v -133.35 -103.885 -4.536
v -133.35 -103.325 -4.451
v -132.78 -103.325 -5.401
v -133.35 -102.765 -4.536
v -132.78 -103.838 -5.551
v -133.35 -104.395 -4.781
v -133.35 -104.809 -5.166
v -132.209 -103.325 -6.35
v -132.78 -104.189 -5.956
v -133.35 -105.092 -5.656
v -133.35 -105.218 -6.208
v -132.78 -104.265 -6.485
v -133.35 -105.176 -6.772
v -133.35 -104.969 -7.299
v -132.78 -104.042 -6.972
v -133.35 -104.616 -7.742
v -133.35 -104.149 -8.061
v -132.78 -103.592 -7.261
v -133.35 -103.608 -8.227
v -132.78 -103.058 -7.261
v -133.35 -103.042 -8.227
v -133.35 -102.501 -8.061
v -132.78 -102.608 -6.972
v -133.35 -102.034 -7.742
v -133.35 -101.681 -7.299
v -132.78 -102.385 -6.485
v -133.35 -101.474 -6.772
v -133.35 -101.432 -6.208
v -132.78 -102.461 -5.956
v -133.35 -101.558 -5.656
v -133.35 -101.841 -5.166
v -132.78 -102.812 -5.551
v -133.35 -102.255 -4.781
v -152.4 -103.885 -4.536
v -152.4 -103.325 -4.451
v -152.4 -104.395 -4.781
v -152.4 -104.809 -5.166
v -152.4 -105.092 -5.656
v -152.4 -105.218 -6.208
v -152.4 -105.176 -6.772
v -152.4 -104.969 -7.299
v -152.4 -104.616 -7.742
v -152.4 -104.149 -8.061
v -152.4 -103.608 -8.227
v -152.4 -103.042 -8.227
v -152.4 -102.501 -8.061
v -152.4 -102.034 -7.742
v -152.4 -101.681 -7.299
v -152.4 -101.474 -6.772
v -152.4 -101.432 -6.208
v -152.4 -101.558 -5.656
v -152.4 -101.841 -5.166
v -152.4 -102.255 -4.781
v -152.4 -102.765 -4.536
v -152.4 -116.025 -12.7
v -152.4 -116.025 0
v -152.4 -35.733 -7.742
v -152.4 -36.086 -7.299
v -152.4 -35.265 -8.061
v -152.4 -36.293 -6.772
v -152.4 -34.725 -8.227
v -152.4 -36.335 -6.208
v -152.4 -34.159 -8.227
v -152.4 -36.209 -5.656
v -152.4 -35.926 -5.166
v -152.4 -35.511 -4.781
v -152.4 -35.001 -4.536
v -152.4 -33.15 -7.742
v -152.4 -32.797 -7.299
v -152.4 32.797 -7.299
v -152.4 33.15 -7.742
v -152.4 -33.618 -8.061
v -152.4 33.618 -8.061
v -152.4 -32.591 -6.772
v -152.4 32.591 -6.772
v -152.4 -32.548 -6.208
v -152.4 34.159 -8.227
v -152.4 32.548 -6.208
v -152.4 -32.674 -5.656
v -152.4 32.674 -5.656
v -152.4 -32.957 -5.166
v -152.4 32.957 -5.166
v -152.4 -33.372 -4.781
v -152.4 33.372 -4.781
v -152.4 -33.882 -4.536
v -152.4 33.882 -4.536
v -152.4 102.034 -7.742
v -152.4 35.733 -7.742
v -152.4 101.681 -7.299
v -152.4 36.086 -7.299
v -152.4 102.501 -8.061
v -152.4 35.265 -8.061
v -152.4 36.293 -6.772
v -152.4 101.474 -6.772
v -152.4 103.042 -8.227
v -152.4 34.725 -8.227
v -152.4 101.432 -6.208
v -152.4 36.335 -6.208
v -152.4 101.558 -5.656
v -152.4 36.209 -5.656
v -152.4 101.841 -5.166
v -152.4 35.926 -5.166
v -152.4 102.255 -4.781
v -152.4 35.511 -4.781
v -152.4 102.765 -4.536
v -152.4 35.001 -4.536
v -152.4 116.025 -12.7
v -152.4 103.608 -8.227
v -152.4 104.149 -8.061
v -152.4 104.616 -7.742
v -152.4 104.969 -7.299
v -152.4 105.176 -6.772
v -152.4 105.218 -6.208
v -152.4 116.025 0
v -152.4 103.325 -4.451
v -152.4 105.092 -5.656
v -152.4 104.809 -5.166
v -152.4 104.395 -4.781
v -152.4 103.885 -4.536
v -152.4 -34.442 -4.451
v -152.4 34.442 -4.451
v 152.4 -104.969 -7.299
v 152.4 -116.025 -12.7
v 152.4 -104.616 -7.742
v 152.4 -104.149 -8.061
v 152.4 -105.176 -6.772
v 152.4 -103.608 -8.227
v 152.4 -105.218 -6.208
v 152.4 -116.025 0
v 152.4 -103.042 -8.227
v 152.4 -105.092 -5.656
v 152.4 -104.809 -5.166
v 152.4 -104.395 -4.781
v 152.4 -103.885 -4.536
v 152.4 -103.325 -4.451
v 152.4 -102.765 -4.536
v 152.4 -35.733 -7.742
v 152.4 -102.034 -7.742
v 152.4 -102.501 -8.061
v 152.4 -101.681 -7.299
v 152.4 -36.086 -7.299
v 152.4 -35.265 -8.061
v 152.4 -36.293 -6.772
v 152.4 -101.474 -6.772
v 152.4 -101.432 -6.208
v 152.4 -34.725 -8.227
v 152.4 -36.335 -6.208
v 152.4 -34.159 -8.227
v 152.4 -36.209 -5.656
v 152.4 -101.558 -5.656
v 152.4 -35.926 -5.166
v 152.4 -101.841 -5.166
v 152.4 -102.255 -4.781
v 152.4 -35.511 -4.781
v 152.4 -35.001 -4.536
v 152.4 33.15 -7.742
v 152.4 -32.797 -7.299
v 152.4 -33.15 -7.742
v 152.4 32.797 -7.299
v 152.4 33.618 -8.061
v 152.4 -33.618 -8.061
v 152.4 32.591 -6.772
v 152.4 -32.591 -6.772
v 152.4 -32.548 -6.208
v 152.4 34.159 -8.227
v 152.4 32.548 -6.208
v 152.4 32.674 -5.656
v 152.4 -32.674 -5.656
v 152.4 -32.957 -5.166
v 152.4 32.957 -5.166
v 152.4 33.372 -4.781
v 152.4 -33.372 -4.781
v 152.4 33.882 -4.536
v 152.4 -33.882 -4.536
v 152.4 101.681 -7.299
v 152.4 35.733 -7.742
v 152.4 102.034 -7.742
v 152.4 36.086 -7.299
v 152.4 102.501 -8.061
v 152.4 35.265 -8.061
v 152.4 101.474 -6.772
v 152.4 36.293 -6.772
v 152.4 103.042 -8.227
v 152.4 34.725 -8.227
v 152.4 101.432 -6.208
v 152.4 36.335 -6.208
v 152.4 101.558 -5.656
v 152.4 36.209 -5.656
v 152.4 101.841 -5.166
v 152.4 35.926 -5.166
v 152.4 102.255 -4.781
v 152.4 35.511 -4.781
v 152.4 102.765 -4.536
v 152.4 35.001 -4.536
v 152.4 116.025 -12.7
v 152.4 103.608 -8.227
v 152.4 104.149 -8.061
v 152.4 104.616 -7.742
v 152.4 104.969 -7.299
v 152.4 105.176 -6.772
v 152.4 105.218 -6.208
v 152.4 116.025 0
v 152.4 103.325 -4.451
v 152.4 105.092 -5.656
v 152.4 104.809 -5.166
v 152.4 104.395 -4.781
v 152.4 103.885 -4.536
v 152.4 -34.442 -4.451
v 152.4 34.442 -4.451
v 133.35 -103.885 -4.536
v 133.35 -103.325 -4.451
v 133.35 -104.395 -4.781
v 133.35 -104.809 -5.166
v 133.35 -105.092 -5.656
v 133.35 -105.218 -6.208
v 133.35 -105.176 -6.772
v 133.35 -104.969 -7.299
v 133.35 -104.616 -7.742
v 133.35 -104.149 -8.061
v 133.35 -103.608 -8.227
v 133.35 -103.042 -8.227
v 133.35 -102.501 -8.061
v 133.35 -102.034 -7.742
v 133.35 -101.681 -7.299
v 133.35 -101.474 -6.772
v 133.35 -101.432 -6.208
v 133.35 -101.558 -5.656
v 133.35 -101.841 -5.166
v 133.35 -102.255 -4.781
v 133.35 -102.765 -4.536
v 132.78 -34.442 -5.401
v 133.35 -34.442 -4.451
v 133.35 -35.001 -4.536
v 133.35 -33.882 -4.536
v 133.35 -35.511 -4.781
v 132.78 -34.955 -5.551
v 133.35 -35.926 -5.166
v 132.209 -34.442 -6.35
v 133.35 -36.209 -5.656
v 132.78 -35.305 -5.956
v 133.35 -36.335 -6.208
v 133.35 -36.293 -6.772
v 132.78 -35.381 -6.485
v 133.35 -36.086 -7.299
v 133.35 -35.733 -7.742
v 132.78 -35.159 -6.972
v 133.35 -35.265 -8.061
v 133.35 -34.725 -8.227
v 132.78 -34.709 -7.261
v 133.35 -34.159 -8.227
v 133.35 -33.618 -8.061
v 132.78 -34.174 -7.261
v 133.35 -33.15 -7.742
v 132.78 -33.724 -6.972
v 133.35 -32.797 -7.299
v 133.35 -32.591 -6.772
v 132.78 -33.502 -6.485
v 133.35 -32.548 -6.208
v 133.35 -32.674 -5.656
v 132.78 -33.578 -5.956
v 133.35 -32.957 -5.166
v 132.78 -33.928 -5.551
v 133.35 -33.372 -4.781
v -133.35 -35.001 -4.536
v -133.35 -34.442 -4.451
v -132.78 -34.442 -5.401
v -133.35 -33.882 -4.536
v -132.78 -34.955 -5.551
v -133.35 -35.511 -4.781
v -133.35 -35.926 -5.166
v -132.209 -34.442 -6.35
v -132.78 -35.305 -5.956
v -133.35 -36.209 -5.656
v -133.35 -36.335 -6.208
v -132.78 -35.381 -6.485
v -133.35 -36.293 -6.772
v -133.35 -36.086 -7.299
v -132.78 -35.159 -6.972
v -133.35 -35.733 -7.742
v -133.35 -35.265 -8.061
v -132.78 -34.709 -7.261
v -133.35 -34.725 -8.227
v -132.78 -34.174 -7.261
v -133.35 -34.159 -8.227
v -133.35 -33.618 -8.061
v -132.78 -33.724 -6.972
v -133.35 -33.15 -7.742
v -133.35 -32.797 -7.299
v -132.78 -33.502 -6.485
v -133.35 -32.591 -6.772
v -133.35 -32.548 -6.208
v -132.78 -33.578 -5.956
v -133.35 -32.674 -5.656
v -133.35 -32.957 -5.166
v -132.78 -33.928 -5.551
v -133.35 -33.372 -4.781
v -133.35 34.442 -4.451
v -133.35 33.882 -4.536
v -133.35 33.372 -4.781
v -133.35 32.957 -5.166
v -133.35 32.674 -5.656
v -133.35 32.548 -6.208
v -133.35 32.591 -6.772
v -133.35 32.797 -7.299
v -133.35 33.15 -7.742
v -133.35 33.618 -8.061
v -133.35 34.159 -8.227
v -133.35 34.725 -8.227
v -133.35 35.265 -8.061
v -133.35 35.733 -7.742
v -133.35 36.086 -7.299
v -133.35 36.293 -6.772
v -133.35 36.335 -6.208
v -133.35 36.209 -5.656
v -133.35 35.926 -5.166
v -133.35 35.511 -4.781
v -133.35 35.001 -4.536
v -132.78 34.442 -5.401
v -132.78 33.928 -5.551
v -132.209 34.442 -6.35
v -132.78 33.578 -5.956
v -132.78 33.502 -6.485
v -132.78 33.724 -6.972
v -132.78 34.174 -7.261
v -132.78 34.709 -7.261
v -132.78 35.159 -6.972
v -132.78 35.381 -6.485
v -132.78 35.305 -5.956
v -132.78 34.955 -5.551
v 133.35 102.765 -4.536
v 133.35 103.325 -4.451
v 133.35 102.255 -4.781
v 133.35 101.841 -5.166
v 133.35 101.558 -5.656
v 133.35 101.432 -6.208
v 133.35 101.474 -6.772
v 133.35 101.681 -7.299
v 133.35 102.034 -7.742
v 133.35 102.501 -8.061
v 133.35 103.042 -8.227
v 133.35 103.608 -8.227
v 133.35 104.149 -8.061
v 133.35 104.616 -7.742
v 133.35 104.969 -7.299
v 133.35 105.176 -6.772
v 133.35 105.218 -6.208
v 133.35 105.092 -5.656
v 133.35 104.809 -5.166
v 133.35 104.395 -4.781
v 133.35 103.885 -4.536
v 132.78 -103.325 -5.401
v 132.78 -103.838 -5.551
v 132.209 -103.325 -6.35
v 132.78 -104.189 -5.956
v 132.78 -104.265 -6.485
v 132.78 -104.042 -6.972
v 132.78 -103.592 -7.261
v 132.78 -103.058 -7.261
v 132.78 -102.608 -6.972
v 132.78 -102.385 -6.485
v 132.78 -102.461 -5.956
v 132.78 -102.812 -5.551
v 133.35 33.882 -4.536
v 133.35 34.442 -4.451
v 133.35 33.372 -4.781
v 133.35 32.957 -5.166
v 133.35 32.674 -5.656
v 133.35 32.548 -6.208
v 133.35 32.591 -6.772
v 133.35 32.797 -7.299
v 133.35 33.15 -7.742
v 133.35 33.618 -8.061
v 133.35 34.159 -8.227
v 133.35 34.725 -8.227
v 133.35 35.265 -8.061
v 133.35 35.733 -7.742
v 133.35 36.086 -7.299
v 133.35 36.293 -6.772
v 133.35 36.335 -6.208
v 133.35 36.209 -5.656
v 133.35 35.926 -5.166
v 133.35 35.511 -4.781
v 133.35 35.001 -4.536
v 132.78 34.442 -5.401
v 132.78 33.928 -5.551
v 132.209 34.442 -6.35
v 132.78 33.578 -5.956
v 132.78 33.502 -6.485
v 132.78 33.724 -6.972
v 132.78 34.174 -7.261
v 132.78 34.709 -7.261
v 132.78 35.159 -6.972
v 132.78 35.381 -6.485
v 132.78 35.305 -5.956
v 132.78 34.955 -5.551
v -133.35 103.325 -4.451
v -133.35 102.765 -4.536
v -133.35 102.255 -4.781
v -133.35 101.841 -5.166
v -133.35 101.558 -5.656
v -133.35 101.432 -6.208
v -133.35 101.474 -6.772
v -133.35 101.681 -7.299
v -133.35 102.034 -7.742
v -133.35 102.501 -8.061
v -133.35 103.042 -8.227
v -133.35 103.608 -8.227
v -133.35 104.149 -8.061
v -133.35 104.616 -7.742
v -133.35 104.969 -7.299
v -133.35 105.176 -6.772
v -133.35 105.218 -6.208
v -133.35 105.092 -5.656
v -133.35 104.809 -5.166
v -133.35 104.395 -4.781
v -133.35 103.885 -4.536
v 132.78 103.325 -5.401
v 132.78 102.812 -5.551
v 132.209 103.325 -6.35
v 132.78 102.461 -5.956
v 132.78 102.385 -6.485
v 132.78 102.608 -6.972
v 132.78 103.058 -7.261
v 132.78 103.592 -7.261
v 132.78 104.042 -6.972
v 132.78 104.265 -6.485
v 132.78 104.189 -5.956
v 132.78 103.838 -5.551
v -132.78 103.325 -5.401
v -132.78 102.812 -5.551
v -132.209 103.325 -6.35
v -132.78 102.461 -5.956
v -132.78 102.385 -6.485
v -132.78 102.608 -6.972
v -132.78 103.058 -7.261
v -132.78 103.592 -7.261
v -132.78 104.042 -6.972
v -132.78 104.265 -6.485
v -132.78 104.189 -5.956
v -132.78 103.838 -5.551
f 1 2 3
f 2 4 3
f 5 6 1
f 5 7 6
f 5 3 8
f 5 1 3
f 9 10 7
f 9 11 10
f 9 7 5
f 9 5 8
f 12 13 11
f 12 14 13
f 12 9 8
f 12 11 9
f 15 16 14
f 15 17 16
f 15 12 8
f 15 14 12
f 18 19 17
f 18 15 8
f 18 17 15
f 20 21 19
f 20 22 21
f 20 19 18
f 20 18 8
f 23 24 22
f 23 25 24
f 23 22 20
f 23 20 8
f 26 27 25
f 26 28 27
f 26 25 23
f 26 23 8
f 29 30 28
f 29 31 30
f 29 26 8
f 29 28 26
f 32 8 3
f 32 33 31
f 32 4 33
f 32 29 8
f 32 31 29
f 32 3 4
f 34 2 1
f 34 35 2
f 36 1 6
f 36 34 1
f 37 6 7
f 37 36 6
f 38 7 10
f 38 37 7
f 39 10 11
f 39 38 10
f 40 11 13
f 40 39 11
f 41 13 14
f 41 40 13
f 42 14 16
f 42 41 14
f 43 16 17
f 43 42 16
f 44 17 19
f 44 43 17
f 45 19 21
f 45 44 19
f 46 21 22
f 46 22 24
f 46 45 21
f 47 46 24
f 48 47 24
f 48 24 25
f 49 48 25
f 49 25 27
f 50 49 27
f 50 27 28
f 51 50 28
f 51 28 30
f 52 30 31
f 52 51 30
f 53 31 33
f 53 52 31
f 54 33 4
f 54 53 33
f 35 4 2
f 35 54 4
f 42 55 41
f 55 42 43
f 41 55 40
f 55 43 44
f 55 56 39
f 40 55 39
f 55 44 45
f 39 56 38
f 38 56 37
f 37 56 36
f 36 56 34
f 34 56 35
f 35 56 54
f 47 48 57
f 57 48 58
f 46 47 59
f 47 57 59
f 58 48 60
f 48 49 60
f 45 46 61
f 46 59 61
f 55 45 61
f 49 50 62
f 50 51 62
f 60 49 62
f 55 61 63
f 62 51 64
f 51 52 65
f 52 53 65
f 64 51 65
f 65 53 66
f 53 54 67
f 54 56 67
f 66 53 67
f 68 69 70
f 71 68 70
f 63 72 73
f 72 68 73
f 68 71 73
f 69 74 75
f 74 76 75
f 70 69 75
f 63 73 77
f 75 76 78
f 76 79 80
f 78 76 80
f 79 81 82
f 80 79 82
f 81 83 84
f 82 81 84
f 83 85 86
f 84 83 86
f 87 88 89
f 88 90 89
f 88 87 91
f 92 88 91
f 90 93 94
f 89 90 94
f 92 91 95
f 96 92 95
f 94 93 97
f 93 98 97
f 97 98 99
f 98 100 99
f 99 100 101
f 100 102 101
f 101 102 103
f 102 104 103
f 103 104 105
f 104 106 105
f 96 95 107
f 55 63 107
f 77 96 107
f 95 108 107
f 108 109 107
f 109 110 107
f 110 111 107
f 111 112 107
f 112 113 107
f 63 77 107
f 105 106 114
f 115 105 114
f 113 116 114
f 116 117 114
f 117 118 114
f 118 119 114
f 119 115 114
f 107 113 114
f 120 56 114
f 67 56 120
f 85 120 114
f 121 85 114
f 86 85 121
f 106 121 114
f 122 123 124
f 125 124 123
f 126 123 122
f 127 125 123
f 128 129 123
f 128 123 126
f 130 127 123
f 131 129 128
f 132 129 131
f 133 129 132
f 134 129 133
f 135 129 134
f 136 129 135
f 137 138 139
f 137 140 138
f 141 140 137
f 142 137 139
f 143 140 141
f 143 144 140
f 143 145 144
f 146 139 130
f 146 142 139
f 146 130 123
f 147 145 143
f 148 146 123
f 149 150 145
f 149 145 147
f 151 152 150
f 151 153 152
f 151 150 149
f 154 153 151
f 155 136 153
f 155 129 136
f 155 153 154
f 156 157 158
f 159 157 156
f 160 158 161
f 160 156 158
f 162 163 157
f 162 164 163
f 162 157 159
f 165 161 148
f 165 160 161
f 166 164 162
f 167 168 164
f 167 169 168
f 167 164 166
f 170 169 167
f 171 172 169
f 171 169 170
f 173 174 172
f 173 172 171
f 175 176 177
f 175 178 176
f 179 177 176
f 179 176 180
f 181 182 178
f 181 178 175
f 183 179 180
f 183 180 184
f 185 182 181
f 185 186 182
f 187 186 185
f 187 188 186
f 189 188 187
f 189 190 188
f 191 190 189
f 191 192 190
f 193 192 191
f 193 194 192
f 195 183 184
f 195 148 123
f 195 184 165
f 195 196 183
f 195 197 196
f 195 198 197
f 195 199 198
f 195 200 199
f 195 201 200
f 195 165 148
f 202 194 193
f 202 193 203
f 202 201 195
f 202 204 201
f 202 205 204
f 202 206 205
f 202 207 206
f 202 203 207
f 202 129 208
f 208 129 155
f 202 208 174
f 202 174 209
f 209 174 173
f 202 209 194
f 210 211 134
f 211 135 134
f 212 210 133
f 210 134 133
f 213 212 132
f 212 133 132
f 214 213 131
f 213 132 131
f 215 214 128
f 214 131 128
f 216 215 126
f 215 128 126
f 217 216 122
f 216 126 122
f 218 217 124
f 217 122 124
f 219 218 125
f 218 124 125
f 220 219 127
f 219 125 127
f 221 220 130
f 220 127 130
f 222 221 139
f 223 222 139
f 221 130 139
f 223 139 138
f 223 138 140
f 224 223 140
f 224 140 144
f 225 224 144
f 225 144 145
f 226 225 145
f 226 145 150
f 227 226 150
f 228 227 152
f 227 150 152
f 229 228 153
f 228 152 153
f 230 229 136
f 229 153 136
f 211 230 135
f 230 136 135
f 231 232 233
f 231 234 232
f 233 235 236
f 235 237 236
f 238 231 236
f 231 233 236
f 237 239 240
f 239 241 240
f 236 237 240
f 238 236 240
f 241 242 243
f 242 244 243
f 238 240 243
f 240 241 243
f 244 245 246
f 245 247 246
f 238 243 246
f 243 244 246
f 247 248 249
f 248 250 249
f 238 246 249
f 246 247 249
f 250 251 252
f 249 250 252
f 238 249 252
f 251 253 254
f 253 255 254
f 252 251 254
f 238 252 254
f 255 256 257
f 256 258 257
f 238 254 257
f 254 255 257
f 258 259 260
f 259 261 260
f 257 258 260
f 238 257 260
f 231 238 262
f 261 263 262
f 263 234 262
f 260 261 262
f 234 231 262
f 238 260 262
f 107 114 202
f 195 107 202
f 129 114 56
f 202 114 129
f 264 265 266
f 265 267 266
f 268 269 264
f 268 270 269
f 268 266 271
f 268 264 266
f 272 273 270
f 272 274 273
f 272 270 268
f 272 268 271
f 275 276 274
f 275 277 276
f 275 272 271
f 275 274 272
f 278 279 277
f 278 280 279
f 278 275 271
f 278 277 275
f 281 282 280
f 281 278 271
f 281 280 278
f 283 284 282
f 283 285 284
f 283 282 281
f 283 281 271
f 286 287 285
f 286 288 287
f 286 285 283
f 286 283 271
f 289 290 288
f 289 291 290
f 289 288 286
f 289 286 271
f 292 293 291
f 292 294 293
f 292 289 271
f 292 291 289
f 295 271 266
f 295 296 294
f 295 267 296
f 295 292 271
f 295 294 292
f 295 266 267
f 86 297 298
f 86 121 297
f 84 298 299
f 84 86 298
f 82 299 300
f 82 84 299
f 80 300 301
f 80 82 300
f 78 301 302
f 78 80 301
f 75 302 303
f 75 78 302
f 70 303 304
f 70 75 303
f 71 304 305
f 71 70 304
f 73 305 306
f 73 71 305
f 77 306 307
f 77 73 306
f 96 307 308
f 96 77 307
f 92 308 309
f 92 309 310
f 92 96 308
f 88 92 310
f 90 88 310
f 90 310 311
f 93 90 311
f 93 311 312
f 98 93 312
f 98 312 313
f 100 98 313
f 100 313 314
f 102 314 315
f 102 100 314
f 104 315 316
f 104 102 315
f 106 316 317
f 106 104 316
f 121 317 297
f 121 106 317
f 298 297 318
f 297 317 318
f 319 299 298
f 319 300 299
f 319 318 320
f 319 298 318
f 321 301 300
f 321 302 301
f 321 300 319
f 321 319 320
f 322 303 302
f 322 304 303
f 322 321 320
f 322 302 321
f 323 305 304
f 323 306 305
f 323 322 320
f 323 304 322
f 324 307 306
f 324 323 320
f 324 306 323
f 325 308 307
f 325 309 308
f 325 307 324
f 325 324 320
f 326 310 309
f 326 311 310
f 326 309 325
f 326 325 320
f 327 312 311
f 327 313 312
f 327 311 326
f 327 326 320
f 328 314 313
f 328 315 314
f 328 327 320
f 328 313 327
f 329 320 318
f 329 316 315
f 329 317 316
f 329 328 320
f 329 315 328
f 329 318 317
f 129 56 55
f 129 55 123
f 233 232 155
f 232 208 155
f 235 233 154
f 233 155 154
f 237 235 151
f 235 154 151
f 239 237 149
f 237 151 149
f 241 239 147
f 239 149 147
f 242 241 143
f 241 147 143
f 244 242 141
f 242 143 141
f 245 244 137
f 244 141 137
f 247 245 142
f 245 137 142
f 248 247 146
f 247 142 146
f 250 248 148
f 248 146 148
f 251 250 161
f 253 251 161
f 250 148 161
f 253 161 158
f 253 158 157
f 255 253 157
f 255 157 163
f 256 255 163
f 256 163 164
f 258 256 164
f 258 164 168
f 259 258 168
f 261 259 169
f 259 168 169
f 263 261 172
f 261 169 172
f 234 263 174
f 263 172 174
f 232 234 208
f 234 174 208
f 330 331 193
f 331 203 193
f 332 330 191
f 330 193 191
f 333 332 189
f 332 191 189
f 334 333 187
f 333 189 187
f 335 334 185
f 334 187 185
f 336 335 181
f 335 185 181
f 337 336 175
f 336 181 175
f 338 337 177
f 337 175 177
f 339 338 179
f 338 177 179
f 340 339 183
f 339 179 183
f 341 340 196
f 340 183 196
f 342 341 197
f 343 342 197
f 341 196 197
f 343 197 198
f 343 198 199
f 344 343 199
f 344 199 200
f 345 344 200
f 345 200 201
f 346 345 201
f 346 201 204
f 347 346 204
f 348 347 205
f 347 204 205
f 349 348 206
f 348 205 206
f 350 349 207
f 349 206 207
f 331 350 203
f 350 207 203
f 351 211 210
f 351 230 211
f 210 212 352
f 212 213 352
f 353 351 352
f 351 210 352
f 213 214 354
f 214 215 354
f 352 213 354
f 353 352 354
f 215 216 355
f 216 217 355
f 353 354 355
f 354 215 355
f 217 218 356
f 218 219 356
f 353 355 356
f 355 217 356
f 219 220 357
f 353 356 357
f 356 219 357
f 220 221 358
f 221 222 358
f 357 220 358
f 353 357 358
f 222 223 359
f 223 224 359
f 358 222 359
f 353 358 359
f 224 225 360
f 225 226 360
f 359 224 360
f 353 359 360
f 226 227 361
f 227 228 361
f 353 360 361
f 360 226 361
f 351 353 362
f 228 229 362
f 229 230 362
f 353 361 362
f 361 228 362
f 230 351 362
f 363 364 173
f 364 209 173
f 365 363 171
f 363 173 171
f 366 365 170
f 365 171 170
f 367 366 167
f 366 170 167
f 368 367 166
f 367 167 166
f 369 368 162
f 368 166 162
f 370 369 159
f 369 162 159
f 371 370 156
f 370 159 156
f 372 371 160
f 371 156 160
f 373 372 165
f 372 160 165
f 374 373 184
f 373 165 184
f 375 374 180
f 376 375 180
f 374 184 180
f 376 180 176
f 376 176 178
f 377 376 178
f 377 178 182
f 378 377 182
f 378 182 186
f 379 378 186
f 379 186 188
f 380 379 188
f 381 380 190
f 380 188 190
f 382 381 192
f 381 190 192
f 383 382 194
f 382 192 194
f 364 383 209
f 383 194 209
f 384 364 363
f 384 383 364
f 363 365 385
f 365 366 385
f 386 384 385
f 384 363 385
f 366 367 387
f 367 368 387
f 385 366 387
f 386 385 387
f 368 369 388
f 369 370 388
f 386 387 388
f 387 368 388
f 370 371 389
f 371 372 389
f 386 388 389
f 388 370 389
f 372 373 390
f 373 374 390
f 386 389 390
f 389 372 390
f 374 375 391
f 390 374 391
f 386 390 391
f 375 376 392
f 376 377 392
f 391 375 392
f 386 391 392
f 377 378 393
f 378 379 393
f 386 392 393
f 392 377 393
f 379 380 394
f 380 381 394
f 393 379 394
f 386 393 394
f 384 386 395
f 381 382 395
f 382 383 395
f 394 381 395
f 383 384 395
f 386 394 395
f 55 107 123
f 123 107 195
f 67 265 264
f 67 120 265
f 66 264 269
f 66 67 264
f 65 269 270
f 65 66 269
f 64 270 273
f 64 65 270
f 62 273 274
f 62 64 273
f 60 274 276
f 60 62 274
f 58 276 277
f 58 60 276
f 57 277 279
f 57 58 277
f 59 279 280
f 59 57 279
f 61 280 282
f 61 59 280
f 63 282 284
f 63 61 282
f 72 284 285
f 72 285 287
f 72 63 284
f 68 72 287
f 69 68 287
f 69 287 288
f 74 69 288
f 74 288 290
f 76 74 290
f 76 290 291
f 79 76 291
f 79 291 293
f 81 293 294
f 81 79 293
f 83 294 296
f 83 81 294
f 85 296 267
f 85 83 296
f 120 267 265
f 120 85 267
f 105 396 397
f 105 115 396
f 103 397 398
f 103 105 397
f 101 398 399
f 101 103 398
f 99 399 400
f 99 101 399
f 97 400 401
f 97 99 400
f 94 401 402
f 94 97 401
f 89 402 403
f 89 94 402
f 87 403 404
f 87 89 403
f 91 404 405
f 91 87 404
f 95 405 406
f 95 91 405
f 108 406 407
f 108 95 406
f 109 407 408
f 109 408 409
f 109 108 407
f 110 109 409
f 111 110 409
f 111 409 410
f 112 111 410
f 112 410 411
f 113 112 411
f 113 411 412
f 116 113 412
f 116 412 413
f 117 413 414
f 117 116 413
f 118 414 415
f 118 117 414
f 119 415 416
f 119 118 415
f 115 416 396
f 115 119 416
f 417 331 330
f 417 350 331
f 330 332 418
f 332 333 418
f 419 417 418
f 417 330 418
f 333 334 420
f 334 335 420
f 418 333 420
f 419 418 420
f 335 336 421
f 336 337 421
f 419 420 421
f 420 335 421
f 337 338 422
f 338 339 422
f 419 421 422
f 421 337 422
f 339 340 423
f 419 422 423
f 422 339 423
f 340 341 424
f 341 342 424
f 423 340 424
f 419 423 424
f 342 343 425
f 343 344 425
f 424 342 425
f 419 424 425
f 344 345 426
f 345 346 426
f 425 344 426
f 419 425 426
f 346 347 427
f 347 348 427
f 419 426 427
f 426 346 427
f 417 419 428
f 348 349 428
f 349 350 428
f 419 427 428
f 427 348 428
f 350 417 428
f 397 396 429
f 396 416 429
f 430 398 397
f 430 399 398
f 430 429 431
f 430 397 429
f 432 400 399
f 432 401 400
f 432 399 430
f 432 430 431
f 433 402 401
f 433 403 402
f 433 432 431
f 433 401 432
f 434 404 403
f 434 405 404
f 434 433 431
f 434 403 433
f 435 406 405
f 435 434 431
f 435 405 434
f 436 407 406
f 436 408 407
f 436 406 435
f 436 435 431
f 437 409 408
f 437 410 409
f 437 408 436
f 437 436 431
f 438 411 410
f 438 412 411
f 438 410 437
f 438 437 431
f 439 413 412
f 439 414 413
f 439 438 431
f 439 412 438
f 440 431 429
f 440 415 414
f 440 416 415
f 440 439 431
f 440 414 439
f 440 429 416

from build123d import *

# Parameters (mm, degrees)
SKETCH1_W                       = 304.799998662
SKETCH1_H                       = 232.05
BOSS_EXTRUDE1_DEPTH             = 12.7
F_10_24_TAPPED_HOLE1_AT_2_COUNT = 2
F_10_24_TAPPED_HOLE1_AT_2_PITCH = 68.883333333
F_10_24_TAPPED_HOLE1_AT_3_COUNT = 2
F_10_24_TAPPED_HOLE1_AT_3_PITCH = 137.766666667
F_10_24_TAPPED_HOLE1_AT_4_COUNT = 2
F_10_24_TAPPED_HOLE1_AT_4_PITCH = 206.65


with BuildPart() as part:
    # Sketch1 → Boss-Extrude1 (new body)
    with BuildSketch(Plane.XY):
        Rectangle(SKETCH1_W, SKETCH1_H)
    extrude(amount=-BOSS_EXTRUDE1_DEPTH)

    # Sketch3 → #10-24 Tapped Hole1 (revolve, cut)
    with BuildSketch(Plane(origin=(-152.399999331, 103.325, -6.35), x_dir=(0, 0, 1), z_dir=(0, 1, 0))):
        Polygon((0, 0), (0, 20.190824014), (1.89865, 19.05), (1.89865, 0), align=None)
    f_10_24_tapped_hole1 = revolve(axis=Axis((-158.749999331, 103.325, -6.35), (1, 0, 0)), mode=Mode.SUBTRACT)

    # #10-24 Tapped Hole1 at 2: #10-24 Tapped Hole1 ×2
    with Locations(*[(0, -i * F_10_24_TAPPED_HOLE1_AT_2_PITCH, 0) for i in range(1, F_10_24_TAPPED_HOLE1_AT_2_COUNT)]):
        add(f_10_24_tapped_hole1, mode=Mode.SUBTRACT)

    # #10-24 Tapped Hole1 at 3: #10-24 Tapped Hole1 ×2
    with Locations(*[(0, -i * F_10_24_TAPPED_HOLE1_AT_3_PITCH, 0) for i in range(1, F_10_24_TAPPED_HOLE1_AT_3_COUNT)]):
        add(f_10_24_tapped_hole1, mode=Mode.SUBTRACT)

    # #10-24 Tapped Hole1 at 4: #10-24 Tapped Hole1 ×2
    with Locations(*[(0, -i * F_10_24_TAPPED_HOLE1_AT_4_PITCH, 0) for i in range(1, F_10_24_TAPPED_HOLE1_AT_4_COUNT)]):
        add(f_10_24_tapped_hole1, mode=Mode.SUBTRACT)

    # Mirror1: #10-24 Tapped Hole1 across plane
    add(f_10_24_tapped_hole1.mirror(Plane(origin=(0, 0, 0), x_dir=(0, 0, 1), z_dir=(1, 0, 0))), mode=Mode.SUBTRACT)

    # Mirror1 copy 1 sketch → Mirror1 copy 1 (revolve, cut)
    with BuildSketch(Plane(origin=(152.399999331, 34.441666667, -6.35), x_dir=(0, 0, 1), z_dir=(0, 1, 0))):
        Polygon((0, 0), (0, -20.190824014), (1.89865, -19.05), (1.89865, 0), align=None)
    revolve(axis=Axis((158.749999331, 34.441666667, -6.35), (1, 0, 0)), mode=Mode.SUBTRACT)

    # Mirror1 copy 2 sketch → Mirror1 copy 2 (revolve, cut)
    with BuildSketch(Plane(origin=(152.399999331, -34.441666667, -6.35), x_dir=(0, 0, 1), z_dir=(0, 1, 0))):
        Polygon((0, 0), (0, -20.190824014), (1.89865, -19.05), (1.89865, 0), align=None)
    revolve(axis=Axis((158.749999331, -34.441666667, -6.35), (1, 0, 0)), mode=Mode.SUBTRACT)

    # Mirror1 copy 3 sketch → Mirror1 copy 3 (revolve, cut)
    with BuildSketch(Plane(origin=(152.399999331, -103.325, -6.35), x_dir=(0, 0, 1), z_dir=(0, 1, 0))):
        Polygon((0, 0), (0, -20.190824014), (1.89865, -19.05), (1.89865, 0), align=None)
    revolve(axis=Axis((158.749999331, -103.325, -6.35), (1, 0, 0)), mode=Mode.SUBTRACT)


solid = part.part
